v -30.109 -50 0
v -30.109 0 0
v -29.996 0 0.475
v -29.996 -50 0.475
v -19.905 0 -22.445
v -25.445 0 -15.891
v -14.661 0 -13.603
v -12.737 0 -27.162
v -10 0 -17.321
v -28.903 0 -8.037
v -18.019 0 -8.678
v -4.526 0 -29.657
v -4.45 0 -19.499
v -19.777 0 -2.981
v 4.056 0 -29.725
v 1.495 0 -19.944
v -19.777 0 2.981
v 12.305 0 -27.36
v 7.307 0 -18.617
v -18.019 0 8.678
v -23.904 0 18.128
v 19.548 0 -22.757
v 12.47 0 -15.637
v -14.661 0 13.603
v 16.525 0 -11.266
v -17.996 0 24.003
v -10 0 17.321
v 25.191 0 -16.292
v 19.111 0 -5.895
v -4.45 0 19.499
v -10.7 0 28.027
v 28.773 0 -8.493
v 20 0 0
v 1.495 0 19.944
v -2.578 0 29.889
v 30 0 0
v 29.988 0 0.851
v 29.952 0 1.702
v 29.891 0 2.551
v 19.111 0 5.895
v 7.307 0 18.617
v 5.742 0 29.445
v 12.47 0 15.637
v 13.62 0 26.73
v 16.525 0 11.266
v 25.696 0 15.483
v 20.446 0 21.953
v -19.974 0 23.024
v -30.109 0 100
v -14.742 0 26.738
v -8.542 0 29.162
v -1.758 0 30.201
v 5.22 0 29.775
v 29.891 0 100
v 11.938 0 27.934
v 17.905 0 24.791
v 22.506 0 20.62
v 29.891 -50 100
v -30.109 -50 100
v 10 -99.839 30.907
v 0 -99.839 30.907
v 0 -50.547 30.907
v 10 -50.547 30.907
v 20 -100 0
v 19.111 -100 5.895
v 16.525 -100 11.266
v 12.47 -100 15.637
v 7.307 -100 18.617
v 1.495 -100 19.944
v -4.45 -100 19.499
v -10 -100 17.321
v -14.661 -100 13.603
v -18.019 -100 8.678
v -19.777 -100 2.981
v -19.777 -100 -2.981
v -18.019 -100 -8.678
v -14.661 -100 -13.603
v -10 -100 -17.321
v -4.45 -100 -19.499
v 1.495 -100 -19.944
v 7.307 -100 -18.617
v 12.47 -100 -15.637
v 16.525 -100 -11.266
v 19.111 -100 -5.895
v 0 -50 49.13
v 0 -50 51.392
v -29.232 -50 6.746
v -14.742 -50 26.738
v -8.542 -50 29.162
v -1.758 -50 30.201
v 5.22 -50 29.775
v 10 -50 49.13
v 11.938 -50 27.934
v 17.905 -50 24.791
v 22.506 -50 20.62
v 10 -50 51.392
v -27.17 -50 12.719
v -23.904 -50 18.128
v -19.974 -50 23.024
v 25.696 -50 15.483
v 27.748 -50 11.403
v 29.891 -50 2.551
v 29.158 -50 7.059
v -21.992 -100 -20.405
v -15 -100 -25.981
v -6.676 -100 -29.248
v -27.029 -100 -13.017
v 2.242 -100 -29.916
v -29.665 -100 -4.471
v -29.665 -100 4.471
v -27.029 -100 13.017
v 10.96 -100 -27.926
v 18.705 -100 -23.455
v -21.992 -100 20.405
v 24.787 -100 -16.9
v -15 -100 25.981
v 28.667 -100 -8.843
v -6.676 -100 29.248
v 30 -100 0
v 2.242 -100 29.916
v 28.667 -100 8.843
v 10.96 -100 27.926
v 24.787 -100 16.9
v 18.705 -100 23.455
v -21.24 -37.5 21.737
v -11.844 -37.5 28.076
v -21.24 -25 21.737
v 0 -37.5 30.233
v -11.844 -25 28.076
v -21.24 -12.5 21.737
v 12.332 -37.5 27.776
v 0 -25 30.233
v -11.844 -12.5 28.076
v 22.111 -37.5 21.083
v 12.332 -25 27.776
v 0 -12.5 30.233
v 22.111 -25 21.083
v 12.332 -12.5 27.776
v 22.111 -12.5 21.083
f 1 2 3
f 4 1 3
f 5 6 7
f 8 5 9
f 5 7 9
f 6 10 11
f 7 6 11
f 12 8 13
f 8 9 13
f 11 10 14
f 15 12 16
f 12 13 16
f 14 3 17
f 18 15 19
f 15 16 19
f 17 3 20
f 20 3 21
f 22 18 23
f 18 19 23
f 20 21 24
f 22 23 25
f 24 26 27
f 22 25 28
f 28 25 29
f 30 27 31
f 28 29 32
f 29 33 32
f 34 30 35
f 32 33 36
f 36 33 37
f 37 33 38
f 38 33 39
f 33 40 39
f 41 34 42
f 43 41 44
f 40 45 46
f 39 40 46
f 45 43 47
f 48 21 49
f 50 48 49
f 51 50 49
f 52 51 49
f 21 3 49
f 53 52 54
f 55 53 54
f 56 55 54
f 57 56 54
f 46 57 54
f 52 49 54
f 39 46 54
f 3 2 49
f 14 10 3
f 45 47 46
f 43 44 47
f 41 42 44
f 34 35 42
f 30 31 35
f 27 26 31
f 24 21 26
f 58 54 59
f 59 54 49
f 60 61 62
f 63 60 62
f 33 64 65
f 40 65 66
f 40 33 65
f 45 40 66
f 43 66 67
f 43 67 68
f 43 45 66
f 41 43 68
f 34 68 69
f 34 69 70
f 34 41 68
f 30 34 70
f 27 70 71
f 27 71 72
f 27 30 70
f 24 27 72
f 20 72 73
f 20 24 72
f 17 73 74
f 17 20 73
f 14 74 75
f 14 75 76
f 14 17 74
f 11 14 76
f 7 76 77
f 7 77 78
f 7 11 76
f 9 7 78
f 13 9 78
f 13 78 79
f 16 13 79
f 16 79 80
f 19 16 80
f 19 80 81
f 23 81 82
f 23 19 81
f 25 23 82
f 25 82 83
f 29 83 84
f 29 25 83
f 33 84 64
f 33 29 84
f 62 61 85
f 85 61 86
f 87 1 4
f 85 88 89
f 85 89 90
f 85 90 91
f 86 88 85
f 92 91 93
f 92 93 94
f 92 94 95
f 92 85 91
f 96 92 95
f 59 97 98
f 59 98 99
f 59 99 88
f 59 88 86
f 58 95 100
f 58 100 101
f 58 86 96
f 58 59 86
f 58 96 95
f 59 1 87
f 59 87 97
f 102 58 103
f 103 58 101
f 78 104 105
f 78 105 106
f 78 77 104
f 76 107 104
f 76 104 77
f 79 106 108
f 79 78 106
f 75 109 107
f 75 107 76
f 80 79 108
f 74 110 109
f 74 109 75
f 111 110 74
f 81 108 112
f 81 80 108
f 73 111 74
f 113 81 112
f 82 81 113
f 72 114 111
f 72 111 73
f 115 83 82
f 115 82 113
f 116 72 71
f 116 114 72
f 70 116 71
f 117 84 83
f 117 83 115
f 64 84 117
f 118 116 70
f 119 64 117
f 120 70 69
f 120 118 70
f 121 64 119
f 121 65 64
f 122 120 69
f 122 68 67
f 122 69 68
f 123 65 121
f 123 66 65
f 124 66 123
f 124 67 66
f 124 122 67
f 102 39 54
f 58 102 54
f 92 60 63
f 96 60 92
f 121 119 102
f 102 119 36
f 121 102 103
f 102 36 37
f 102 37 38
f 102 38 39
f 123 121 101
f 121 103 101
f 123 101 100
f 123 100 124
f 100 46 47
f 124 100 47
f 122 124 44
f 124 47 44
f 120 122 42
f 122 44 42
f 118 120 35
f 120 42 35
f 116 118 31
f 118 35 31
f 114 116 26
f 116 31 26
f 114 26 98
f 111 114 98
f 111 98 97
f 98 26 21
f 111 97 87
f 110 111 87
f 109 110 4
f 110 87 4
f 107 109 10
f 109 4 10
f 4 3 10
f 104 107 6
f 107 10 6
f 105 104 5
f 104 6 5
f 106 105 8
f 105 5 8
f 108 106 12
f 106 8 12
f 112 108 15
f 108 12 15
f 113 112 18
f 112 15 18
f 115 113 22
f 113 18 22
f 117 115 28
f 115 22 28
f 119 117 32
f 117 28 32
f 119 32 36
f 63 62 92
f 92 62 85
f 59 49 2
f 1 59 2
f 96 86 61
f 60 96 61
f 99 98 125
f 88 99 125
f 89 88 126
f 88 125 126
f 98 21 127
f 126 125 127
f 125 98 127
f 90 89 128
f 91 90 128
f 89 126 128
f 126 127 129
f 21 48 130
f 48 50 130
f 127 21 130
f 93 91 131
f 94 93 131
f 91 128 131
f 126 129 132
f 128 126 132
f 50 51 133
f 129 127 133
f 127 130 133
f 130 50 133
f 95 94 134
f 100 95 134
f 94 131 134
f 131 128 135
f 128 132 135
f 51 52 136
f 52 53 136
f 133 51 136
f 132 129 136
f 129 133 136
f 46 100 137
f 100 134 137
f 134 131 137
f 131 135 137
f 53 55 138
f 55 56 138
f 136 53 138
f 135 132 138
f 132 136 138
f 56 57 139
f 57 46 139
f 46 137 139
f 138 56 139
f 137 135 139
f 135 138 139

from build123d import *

# Parameters (mm, degrees)
F0_R     = 30
F0_R_2   = 20
F1_DEPTH = 100
F3_DEPTH = 50
F5_DEPTH = 10


with BuildPart() as f1:
    # F0 (on Front) → F1 (new body)
    with BuildSketch(Plane.XZ):
        Circle(F0_R)
        Circle(F0_R_2, mode=Mode.SUBTRACT)
    extrude(amount=F1_DEPTH)

    # F2 (on Front) → F3 (join)
    with BuildSketch(Plane.XZ):
        with BuildLine():
            Line((-30.1086945207, 100), (-30.1086945207, 0))
            add(Edge.make_bspline(
                [(-30.1086945207, 0), (-28.1945433239, 8.0804869026), (-24.3908970229, 24.1373763311), (-0.0363134271, 33.4382771528), (25.4775085898, 23.5551805153), (28.4355133491, 7.7691491651), (29.8913054793, 0)],
                knots=[0, 0, 0, 0, 0.2515656937, 0.4998909813, 0.7538696409, 1, 1, 1, 1], degree=3))
            Line((29.8913054793, 0), (29.8913054793, 100))
            Line((29.8913054793, 100), (-30.1086945207, 100))
        make_face()
    extrude(amount=F3_DEPTH)

    # F4 (on Right) → F5 (join)
    with BuildSketch(Plane.YZ):
        Polygon((-99.8394265771, 30.9073068202), (-50.5473278463, 30.9073068202), (-49.9311797321, 51.420763135), align=None)
    extrude(amount=F5_DEPTH)


solid = f1.part
